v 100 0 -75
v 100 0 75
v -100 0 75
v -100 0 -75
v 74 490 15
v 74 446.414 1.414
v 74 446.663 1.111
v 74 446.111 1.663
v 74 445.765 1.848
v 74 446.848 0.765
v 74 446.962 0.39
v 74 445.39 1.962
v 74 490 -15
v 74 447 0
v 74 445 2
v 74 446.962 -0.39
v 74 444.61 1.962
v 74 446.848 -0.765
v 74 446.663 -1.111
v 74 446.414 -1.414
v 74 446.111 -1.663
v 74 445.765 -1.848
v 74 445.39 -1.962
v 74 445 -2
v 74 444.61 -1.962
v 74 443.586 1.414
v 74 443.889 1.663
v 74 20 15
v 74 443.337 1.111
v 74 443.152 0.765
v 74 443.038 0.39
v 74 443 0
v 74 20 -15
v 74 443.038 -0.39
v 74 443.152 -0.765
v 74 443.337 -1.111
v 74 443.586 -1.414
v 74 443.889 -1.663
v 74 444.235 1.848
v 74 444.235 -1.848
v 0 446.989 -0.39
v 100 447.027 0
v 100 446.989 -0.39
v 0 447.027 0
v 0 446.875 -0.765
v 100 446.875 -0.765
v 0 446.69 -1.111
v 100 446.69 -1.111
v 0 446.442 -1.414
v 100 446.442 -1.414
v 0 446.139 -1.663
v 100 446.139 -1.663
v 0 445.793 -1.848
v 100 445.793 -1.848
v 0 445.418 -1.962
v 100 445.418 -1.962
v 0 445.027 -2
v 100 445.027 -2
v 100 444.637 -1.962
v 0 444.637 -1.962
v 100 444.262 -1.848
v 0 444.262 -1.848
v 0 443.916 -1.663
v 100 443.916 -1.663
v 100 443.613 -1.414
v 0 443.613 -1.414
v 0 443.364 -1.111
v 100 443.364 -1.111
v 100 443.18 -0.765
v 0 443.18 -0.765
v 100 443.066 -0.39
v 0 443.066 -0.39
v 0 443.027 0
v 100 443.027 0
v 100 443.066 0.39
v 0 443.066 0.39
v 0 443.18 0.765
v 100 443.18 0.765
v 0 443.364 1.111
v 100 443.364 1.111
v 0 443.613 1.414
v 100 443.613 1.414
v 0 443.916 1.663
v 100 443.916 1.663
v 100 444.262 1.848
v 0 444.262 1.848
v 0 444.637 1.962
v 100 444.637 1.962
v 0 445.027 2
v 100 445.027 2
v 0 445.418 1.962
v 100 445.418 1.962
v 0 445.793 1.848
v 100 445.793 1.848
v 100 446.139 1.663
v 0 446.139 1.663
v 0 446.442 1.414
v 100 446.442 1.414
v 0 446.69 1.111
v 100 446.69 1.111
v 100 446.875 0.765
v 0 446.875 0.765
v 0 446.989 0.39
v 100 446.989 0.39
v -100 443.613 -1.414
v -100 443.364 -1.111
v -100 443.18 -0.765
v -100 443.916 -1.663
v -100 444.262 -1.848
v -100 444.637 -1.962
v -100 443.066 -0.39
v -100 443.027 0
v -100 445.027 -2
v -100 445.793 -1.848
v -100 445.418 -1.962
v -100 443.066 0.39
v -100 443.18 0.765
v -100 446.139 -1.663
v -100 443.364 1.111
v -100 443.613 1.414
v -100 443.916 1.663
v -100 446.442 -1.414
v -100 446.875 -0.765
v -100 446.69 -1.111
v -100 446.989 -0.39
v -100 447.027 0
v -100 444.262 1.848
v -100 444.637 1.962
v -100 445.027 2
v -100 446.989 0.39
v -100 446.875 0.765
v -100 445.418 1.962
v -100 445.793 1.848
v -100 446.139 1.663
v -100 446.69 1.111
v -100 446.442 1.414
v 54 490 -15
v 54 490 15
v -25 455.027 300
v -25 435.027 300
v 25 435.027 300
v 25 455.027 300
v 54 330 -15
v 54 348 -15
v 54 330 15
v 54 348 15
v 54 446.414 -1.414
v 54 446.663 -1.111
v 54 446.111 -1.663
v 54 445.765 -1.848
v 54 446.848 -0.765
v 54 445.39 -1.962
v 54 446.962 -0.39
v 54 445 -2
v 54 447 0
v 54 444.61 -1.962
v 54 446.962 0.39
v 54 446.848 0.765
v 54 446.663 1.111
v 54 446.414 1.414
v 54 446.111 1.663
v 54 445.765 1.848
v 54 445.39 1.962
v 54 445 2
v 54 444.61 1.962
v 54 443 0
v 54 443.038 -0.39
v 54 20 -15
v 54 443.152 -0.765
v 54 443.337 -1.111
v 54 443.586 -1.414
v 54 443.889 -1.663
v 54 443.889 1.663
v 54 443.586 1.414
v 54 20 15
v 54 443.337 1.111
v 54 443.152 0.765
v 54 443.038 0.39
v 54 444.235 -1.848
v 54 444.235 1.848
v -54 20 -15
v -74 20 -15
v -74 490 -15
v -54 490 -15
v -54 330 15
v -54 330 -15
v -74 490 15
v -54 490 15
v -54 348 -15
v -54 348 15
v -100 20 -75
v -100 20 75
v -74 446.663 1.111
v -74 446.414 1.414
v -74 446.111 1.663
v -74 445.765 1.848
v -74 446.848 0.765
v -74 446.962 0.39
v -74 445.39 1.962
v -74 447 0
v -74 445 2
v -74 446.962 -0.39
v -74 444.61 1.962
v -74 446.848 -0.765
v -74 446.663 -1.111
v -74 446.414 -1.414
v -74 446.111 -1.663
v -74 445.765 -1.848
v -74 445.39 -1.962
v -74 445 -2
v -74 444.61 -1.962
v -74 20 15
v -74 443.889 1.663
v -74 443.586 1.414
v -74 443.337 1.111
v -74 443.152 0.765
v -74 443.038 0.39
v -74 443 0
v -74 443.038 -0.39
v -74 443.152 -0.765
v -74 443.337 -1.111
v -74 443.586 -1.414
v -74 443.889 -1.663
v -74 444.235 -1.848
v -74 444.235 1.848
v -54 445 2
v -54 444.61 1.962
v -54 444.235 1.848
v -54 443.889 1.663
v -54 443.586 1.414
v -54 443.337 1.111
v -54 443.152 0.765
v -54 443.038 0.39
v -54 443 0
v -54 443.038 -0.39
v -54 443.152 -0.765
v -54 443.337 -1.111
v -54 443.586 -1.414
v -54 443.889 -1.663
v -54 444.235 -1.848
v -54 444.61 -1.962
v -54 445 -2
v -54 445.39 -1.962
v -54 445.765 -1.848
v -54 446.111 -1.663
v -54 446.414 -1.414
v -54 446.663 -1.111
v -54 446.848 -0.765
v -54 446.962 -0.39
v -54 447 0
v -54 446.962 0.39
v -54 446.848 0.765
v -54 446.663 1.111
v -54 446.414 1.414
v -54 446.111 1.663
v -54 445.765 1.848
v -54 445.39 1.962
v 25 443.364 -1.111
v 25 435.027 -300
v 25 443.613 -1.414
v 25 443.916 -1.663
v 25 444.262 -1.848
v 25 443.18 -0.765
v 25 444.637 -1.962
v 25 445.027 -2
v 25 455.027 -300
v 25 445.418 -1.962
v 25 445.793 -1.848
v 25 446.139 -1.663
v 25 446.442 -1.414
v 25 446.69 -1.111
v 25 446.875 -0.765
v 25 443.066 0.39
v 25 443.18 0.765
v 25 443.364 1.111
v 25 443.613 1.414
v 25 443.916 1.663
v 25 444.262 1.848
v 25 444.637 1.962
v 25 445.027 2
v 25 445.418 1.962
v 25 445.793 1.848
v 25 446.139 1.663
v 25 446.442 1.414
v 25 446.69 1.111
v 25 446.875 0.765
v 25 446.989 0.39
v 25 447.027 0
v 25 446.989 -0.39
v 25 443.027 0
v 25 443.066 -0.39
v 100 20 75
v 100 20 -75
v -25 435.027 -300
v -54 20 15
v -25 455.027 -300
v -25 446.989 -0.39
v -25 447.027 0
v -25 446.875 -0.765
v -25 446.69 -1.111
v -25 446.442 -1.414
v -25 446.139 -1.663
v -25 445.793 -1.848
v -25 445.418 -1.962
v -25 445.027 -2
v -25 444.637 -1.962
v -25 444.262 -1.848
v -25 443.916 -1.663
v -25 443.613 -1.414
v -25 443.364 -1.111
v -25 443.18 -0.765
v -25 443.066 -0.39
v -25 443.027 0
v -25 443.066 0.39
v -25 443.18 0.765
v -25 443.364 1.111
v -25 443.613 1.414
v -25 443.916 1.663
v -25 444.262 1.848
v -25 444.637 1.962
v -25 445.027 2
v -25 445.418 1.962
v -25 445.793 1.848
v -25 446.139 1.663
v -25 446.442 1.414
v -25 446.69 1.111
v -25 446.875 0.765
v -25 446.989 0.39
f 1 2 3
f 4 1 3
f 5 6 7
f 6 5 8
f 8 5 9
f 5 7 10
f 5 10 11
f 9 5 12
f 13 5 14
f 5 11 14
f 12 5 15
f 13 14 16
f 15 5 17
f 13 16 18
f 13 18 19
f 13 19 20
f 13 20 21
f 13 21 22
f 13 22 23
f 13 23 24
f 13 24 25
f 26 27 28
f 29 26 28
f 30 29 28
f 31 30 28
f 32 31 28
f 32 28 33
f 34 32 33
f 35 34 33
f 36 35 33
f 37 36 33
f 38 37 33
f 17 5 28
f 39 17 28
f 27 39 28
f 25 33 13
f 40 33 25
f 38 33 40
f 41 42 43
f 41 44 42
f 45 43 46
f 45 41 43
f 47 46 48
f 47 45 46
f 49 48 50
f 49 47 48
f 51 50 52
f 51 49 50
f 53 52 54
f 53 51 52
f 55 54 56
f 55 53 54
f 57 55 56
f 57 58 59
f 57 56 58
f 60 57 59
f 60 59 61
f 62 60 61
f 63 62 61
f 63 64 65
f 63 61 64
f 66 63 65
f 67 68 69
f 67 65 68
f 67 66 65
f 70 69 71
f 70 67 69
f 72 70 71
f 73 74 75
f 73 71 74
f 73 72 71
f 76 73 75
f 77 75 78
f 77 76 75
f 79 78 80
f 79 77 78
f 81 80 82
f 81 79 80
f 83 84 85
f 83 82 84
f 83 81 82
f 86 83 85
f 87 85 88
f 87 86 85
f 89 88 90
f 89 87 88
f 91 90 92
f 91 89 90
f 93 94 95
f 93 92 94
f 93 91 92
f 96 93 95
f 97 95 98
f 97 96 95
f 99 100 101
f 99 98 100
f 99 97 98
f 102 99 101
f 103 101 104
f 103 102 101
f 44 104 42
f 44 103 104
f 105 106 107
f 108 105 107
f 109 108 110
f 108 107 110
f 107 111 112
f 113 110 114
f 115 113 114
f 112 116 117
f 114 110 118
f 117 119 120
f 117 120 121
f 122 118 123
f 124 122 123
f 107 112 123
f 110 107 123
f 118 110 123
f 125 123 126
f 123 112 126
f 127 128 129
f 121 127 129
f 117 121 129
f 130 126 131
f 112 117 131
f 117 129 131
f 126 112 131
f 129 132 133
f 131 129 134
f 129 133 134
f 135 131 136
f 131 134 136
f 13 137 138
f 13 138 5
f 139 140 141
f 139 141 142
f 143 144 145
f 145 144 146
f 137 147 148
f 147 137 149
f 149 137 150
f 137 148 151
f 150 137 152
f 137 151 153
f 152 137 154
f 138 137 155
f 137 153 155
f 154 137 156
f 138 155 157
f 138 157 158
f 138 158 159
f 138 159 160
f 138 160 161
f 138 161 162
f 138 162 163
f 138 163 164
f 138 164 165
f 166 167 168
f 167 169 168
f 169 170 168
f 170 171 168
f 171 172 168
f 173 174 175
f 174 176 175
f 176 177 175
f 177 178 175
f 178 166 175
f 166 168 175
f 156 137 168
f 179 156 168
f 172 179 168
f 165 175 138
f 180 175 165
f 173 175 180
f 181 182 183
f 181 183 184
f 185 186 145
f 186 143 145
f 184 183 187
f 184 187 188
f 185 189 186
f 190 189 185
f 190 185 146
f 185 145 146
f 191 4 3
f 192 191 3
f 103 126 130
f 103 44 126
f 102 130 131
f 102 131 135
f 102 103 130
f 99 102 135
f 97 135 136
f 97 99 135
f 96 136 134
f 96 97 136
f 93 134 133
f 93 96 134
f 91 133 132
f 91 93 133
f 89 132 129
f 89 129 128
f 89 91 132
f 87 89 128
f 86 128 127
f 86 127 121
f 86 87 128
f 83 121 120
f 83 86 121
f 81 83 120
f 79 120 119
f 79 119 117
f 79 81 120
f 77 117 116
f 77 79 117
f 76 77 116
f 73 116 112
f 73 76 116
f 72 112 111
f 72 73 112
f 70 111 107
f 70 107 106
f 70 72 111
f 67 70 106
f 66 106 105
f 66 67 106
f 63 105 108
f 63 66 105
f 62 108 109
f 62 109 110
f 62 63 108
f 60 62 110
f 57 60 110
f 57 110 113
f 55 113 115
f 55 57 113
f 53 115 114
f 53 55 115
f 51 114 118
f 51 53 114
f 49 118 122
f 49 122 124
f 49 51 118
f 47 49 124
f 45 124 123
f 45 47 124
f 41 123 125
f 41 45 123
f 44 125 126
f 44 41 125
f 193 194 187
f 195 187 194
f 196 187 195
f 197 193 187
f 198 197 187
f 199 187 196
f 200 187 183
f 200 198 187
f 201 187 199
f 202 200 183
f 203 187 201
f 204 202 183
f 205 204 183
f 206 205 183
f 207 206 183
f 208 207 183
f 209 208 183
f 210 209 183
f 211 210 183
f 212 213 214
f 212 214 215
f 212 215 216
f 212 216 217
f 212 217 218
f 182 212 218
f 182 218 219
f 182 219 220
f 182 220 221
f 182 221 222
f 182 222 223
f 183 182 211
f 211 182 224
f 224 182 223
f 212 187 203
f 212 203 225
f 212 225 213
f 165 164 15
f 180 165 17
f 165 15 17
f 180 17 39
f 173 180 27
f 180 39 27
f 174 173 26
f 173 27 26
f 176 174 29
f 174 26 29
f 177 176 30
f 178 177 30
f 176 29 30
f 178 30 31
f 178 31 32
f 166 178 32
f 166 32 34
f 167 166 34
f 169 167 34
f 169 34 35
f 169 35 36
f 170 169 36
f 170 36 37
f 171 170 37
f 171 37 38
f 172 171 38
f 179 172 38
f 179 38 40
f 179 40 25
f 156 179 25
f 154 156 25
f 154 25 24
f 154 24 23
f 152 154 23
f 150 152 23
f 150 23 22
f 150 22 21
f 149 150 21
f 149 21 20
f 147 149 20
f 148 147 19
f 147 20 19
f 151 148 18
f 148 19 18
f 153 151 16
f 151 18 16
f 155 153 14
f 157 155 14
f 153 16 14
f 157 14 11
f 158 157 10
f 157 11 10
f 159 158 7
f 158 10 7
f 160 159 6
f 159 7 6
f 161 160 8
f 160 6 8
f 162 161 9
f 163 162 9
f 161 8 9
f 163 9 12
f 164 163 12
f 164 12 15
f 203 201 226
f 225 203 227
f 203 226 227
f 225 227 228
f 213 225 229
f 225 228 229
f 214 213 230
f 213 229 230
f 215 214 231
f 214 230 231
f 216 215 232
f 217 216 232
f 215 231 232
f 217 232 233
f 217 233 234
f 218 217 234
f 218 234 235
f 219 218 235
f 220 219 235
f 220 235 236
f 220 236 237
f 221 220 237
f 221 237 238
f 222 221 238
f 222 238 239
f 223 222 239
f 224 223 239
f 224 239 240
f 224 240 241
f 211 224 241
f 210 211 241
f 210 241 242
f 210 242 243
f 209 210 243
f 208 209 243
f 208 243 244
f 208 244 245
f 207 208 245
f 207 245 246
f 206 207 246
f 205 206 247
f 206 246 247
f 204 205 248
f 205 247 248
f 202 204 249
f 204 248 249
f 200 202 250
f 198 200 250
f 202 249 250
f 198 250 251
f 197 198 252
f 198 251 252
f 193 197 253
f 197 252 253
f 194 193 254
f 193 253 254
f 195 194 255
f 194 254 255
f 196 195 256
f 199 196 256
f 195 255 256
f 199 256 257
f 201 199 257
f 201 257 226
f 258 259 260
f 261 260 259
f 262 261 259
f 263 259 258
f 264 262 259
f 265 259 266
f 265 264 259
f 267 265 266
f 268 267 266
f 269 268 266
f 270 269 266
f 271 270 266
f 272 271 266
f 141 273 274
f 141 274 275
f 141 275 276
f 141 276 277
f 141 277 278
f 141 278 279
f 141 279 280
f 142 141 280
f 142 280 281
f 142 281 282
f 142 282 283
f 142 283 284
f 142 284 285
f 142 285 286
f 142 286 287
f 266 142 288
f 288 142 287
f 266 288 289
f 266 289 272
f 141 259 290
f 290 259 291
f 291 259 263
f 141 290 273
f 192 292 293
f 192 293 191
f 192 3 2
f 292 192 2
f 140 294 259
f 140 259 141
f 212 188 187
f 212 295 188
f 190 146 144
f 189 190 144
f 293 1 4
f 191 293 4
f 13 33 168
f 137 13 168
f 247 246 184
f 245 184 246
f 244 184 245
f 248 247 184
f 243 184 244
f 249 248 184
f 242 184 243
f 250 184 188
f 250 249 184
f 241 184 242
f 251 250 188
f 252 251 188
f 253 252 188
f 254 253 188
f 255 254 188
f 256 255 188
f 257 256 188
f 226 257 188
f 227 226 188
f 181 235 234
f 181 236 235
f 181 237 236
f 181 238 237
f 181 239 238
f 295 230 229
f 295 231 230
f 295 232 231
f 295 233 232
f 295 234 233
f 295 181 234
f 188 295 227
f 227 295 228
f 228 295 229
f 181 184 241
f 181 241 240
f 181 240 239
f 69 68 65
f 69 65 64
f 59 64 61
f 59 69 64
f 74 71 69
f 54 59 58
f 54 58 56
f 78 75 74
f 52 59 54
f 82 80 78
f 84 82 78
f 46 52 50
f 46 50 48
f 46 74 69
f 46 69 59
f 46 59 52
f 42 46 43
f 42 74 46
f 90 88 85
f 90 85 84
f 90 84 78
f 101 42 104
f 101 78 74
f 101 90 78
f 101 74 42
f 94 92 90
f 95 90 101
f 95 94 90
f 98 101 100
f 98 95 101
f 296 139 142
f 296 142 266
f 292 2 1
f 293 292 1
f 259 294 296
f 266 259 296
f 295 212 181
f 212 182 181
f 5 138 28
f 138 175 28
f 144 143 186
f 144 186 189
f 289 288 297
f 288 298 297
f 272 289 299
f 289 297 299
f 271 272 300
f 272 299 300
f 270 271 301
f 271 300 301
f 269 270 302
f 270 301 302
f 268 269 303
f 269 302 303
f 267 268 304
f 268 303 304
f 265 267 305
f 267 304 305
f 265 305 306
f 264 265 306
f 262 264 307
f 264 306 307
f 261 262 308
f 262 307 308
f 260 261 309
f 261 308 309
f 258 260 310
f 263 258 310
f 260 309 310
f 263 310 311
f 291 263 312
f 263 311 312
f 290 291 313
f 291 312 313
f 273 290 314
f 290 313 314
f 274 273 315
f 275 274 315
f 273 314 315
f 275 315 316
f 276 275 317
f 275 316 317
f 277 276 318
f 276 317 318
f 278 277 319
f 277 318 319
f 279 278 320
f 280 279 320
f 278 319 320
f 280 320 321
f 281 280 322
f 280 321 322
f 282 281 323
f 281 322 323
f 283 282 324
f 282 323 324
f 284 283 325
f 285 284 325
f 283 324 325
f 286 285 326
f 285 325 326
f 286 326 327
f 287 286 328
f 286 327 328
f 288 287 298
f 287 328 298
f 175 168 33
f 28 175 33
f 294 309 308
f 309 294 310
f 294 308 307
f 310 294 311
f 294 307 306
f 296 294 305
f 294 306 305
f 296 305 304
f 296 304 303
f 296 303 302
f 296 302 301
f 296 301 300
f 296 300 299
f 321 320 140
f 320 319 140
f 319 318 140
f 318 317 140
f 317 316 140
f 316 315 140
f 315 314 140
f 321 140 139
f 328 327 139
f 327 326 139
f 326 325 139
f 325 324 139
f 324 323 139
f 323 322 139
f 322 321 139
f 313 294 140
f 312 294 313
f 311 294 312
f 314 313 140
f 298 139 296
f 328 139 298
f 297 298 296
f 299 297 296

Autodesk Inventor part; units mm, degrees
ref_plane "YZ Plane" through (0, 0, 0) normal (1, 0, 0) x (0, 1, 0)
ref_plane "XZ Plane" through (0, 0, 0) normal (0, 1, 0) x (-1, 0, 0)
ref_plane "XY Plane" through (0, 0, 0) normal (0, 0, 1) x (1, 0, 0)
sketch "Boceto1" plane through (0, 0, 0) normal (0, 1, 0) x (-1, 0, 0)
  line L0 (-100, -75) -> (100, -75)
  line L1 (100, -75) -> (100, 75)
  line L2 (100, 75) -> (-100, 75)
  line L3 (-100, 75) -> (-100, -75)
  line L4 (-100, -75) -> (100, 75) construction
  line L5 (100, -75) -> (-100, 75) construction
  point P0 (0, 0)
  dimension "d0" = 200
  dimension "d1" = 150
extrude "Extrusión1" add sketch "Boceto1" along normal blind 20
sketch "Boceto2" plane through (0, 20, 0) normal (0, 1, 0) x (1, 0, 0)
  line L0 (100, -75) -> (100, 75) projected
  line L1 (100, 0) -> (74, 0)
  line L2 (74, 0) -> (74, 15)
  line L3 (74, 15) -> (54, 15)
  line L4 (54, 15) -> (54, -15)
  line L5 (54, -15) -> (74, -15)
  line L6 (74, -15) -> (74, 0)
  line L7 (0, 0) -> (0, -60.8498)
  line L8 (-74, 0) -> (-74, 15)
  line L9 (-74, 15) -> (-54, 15)
  line L10 (-54, 15) -> (-54, -15)
  line L11 (-54, -15) -> (-74, -15)
  line L12 (-74, -15) -> (-74, 0)
  dimension "d4" = 26
  dimension "d5" = 15
  dimension "d6" = 20
  dimension "d7" = 30
extrude "Extrusión2" add sketch "Boceto2" along normal blind 470 separate body
sketch "Boceto3" plane through (54, 20, -15) normal (-1, 0, 0) x (0, 0, 1)
  line L0 (30, 0) -> (30, 470) projected
  line L1 (0, 0) -> (0, 470) projected
  line L2 (30, 470) -> (30, 328)
  line L3 (30, 328) -> (0, 328)
  line L4 (0, 328) -> (0, 310)
  line L5 (0, 310) -> (30, 310)
  point P0 (15, -20)
  dimension "d10" = 142
  dimension "d11" = 18
extrude "Extrusión3" add sketch "Boceto3" along normal up to surface (108 mm away) separate body
sketch "Boceto4" plane through (-74, 20, -15) normal (-1, 0, 0) x (0, 0, 1)
  line L0 (0, 470) -> (30, 470) projected
  line L1 (0, 0) -> (0, 470) projected
  line L2 (15, 470) -> (15, 425)
  circle A0 centre (15, 425) radius 2
  point P0 (15, -20)
  dimension "d14" = 45
  dimension "d15" = 4
sketch "Boceto5" plane through (-74, 20, -15) normal (-1, 0, 0) x (0, 0, 1)
  line L0 (0, 0) -> (30, 0) projected
  line L1 (30, 0) -> (30, 470) projected
  line L2 (0, 470) -> (30, 470) projected
  line L3 (0, 0) -> (0, 470) projected
  point P0 (15, -20)
hole "Hole1" at (-74, 445, 0) direction (1, 0, 0) diameter 4 end through all bodies 2
sketch "Boceto6" plane through (-74, 20, -15) normal (-1, 0, 0) x (0, 0, 1)
  circle A0 centre (15, 425) radius 2 projected
  line L0 (0, 0) -> (30, 0) projected
  line L1 (30, 0) -> (30, 470) projected
  line L2 (0, 470) -> (30, 470) projected
  line L3 (0, 0) -> (0, 470) projected
  circle A1 centre (15, 425) radius 2
  point P0 (15, -20)
  dimension "d23" = 4
sketch "Boceto7" plane through (0, 0, 0) normal (1, 0, 0) x (0, 1, 0)
  circle A0 centre (445.0274, 0) radius 2
  point P0 (0, 0)
  dimension "d24" = 4
extrude "Extrusión4" add sketch "Boceto7" along normal blind 100 and the other way blind 100 separate body
sketch "Boceto8" plane through (0, 0, 0) normal (1, 0, 0) x (0, 1, 0)
  circle A0 centre (445.0274, 0) radius 2 projected
  line L0 (445.0274, 0) -> (455.0274, 0)
  line L1 (445.0274, 0) -> (445.0274, 300)
  line L2 (445.0274, 0) -> (445.0274, -300)
  line L3 (445.0274, -300) -> (455.0274, -300)
  line L4 (445.0274, -300) -> (435.0274, -300)
  line L5 (435.0274, -300) -> (435.0274, 300)
  line L6 (435.0274, 300) -> (455.0274, 300)
  line L7 (455.0274, 300) -> (455.0274, -300)
  point P0 (0, 0)
  dimension "d29" = 10
  dimension "d32" = 300
  dimension "d33" = 300
  dimension "d34" = 10
  dimension "d35" = 10
  dimension "d36" = 20
extrude "Extrusión5" add sketch "Boceto8" along normal mid plane 50 separate body contours L0 L7 L3 L2 A0 | A0 L1 L6 L7 L0 | A0 L2 L4 L5 L6 L1
properties part number "BrazoTFG" material "Madera (roble)"
